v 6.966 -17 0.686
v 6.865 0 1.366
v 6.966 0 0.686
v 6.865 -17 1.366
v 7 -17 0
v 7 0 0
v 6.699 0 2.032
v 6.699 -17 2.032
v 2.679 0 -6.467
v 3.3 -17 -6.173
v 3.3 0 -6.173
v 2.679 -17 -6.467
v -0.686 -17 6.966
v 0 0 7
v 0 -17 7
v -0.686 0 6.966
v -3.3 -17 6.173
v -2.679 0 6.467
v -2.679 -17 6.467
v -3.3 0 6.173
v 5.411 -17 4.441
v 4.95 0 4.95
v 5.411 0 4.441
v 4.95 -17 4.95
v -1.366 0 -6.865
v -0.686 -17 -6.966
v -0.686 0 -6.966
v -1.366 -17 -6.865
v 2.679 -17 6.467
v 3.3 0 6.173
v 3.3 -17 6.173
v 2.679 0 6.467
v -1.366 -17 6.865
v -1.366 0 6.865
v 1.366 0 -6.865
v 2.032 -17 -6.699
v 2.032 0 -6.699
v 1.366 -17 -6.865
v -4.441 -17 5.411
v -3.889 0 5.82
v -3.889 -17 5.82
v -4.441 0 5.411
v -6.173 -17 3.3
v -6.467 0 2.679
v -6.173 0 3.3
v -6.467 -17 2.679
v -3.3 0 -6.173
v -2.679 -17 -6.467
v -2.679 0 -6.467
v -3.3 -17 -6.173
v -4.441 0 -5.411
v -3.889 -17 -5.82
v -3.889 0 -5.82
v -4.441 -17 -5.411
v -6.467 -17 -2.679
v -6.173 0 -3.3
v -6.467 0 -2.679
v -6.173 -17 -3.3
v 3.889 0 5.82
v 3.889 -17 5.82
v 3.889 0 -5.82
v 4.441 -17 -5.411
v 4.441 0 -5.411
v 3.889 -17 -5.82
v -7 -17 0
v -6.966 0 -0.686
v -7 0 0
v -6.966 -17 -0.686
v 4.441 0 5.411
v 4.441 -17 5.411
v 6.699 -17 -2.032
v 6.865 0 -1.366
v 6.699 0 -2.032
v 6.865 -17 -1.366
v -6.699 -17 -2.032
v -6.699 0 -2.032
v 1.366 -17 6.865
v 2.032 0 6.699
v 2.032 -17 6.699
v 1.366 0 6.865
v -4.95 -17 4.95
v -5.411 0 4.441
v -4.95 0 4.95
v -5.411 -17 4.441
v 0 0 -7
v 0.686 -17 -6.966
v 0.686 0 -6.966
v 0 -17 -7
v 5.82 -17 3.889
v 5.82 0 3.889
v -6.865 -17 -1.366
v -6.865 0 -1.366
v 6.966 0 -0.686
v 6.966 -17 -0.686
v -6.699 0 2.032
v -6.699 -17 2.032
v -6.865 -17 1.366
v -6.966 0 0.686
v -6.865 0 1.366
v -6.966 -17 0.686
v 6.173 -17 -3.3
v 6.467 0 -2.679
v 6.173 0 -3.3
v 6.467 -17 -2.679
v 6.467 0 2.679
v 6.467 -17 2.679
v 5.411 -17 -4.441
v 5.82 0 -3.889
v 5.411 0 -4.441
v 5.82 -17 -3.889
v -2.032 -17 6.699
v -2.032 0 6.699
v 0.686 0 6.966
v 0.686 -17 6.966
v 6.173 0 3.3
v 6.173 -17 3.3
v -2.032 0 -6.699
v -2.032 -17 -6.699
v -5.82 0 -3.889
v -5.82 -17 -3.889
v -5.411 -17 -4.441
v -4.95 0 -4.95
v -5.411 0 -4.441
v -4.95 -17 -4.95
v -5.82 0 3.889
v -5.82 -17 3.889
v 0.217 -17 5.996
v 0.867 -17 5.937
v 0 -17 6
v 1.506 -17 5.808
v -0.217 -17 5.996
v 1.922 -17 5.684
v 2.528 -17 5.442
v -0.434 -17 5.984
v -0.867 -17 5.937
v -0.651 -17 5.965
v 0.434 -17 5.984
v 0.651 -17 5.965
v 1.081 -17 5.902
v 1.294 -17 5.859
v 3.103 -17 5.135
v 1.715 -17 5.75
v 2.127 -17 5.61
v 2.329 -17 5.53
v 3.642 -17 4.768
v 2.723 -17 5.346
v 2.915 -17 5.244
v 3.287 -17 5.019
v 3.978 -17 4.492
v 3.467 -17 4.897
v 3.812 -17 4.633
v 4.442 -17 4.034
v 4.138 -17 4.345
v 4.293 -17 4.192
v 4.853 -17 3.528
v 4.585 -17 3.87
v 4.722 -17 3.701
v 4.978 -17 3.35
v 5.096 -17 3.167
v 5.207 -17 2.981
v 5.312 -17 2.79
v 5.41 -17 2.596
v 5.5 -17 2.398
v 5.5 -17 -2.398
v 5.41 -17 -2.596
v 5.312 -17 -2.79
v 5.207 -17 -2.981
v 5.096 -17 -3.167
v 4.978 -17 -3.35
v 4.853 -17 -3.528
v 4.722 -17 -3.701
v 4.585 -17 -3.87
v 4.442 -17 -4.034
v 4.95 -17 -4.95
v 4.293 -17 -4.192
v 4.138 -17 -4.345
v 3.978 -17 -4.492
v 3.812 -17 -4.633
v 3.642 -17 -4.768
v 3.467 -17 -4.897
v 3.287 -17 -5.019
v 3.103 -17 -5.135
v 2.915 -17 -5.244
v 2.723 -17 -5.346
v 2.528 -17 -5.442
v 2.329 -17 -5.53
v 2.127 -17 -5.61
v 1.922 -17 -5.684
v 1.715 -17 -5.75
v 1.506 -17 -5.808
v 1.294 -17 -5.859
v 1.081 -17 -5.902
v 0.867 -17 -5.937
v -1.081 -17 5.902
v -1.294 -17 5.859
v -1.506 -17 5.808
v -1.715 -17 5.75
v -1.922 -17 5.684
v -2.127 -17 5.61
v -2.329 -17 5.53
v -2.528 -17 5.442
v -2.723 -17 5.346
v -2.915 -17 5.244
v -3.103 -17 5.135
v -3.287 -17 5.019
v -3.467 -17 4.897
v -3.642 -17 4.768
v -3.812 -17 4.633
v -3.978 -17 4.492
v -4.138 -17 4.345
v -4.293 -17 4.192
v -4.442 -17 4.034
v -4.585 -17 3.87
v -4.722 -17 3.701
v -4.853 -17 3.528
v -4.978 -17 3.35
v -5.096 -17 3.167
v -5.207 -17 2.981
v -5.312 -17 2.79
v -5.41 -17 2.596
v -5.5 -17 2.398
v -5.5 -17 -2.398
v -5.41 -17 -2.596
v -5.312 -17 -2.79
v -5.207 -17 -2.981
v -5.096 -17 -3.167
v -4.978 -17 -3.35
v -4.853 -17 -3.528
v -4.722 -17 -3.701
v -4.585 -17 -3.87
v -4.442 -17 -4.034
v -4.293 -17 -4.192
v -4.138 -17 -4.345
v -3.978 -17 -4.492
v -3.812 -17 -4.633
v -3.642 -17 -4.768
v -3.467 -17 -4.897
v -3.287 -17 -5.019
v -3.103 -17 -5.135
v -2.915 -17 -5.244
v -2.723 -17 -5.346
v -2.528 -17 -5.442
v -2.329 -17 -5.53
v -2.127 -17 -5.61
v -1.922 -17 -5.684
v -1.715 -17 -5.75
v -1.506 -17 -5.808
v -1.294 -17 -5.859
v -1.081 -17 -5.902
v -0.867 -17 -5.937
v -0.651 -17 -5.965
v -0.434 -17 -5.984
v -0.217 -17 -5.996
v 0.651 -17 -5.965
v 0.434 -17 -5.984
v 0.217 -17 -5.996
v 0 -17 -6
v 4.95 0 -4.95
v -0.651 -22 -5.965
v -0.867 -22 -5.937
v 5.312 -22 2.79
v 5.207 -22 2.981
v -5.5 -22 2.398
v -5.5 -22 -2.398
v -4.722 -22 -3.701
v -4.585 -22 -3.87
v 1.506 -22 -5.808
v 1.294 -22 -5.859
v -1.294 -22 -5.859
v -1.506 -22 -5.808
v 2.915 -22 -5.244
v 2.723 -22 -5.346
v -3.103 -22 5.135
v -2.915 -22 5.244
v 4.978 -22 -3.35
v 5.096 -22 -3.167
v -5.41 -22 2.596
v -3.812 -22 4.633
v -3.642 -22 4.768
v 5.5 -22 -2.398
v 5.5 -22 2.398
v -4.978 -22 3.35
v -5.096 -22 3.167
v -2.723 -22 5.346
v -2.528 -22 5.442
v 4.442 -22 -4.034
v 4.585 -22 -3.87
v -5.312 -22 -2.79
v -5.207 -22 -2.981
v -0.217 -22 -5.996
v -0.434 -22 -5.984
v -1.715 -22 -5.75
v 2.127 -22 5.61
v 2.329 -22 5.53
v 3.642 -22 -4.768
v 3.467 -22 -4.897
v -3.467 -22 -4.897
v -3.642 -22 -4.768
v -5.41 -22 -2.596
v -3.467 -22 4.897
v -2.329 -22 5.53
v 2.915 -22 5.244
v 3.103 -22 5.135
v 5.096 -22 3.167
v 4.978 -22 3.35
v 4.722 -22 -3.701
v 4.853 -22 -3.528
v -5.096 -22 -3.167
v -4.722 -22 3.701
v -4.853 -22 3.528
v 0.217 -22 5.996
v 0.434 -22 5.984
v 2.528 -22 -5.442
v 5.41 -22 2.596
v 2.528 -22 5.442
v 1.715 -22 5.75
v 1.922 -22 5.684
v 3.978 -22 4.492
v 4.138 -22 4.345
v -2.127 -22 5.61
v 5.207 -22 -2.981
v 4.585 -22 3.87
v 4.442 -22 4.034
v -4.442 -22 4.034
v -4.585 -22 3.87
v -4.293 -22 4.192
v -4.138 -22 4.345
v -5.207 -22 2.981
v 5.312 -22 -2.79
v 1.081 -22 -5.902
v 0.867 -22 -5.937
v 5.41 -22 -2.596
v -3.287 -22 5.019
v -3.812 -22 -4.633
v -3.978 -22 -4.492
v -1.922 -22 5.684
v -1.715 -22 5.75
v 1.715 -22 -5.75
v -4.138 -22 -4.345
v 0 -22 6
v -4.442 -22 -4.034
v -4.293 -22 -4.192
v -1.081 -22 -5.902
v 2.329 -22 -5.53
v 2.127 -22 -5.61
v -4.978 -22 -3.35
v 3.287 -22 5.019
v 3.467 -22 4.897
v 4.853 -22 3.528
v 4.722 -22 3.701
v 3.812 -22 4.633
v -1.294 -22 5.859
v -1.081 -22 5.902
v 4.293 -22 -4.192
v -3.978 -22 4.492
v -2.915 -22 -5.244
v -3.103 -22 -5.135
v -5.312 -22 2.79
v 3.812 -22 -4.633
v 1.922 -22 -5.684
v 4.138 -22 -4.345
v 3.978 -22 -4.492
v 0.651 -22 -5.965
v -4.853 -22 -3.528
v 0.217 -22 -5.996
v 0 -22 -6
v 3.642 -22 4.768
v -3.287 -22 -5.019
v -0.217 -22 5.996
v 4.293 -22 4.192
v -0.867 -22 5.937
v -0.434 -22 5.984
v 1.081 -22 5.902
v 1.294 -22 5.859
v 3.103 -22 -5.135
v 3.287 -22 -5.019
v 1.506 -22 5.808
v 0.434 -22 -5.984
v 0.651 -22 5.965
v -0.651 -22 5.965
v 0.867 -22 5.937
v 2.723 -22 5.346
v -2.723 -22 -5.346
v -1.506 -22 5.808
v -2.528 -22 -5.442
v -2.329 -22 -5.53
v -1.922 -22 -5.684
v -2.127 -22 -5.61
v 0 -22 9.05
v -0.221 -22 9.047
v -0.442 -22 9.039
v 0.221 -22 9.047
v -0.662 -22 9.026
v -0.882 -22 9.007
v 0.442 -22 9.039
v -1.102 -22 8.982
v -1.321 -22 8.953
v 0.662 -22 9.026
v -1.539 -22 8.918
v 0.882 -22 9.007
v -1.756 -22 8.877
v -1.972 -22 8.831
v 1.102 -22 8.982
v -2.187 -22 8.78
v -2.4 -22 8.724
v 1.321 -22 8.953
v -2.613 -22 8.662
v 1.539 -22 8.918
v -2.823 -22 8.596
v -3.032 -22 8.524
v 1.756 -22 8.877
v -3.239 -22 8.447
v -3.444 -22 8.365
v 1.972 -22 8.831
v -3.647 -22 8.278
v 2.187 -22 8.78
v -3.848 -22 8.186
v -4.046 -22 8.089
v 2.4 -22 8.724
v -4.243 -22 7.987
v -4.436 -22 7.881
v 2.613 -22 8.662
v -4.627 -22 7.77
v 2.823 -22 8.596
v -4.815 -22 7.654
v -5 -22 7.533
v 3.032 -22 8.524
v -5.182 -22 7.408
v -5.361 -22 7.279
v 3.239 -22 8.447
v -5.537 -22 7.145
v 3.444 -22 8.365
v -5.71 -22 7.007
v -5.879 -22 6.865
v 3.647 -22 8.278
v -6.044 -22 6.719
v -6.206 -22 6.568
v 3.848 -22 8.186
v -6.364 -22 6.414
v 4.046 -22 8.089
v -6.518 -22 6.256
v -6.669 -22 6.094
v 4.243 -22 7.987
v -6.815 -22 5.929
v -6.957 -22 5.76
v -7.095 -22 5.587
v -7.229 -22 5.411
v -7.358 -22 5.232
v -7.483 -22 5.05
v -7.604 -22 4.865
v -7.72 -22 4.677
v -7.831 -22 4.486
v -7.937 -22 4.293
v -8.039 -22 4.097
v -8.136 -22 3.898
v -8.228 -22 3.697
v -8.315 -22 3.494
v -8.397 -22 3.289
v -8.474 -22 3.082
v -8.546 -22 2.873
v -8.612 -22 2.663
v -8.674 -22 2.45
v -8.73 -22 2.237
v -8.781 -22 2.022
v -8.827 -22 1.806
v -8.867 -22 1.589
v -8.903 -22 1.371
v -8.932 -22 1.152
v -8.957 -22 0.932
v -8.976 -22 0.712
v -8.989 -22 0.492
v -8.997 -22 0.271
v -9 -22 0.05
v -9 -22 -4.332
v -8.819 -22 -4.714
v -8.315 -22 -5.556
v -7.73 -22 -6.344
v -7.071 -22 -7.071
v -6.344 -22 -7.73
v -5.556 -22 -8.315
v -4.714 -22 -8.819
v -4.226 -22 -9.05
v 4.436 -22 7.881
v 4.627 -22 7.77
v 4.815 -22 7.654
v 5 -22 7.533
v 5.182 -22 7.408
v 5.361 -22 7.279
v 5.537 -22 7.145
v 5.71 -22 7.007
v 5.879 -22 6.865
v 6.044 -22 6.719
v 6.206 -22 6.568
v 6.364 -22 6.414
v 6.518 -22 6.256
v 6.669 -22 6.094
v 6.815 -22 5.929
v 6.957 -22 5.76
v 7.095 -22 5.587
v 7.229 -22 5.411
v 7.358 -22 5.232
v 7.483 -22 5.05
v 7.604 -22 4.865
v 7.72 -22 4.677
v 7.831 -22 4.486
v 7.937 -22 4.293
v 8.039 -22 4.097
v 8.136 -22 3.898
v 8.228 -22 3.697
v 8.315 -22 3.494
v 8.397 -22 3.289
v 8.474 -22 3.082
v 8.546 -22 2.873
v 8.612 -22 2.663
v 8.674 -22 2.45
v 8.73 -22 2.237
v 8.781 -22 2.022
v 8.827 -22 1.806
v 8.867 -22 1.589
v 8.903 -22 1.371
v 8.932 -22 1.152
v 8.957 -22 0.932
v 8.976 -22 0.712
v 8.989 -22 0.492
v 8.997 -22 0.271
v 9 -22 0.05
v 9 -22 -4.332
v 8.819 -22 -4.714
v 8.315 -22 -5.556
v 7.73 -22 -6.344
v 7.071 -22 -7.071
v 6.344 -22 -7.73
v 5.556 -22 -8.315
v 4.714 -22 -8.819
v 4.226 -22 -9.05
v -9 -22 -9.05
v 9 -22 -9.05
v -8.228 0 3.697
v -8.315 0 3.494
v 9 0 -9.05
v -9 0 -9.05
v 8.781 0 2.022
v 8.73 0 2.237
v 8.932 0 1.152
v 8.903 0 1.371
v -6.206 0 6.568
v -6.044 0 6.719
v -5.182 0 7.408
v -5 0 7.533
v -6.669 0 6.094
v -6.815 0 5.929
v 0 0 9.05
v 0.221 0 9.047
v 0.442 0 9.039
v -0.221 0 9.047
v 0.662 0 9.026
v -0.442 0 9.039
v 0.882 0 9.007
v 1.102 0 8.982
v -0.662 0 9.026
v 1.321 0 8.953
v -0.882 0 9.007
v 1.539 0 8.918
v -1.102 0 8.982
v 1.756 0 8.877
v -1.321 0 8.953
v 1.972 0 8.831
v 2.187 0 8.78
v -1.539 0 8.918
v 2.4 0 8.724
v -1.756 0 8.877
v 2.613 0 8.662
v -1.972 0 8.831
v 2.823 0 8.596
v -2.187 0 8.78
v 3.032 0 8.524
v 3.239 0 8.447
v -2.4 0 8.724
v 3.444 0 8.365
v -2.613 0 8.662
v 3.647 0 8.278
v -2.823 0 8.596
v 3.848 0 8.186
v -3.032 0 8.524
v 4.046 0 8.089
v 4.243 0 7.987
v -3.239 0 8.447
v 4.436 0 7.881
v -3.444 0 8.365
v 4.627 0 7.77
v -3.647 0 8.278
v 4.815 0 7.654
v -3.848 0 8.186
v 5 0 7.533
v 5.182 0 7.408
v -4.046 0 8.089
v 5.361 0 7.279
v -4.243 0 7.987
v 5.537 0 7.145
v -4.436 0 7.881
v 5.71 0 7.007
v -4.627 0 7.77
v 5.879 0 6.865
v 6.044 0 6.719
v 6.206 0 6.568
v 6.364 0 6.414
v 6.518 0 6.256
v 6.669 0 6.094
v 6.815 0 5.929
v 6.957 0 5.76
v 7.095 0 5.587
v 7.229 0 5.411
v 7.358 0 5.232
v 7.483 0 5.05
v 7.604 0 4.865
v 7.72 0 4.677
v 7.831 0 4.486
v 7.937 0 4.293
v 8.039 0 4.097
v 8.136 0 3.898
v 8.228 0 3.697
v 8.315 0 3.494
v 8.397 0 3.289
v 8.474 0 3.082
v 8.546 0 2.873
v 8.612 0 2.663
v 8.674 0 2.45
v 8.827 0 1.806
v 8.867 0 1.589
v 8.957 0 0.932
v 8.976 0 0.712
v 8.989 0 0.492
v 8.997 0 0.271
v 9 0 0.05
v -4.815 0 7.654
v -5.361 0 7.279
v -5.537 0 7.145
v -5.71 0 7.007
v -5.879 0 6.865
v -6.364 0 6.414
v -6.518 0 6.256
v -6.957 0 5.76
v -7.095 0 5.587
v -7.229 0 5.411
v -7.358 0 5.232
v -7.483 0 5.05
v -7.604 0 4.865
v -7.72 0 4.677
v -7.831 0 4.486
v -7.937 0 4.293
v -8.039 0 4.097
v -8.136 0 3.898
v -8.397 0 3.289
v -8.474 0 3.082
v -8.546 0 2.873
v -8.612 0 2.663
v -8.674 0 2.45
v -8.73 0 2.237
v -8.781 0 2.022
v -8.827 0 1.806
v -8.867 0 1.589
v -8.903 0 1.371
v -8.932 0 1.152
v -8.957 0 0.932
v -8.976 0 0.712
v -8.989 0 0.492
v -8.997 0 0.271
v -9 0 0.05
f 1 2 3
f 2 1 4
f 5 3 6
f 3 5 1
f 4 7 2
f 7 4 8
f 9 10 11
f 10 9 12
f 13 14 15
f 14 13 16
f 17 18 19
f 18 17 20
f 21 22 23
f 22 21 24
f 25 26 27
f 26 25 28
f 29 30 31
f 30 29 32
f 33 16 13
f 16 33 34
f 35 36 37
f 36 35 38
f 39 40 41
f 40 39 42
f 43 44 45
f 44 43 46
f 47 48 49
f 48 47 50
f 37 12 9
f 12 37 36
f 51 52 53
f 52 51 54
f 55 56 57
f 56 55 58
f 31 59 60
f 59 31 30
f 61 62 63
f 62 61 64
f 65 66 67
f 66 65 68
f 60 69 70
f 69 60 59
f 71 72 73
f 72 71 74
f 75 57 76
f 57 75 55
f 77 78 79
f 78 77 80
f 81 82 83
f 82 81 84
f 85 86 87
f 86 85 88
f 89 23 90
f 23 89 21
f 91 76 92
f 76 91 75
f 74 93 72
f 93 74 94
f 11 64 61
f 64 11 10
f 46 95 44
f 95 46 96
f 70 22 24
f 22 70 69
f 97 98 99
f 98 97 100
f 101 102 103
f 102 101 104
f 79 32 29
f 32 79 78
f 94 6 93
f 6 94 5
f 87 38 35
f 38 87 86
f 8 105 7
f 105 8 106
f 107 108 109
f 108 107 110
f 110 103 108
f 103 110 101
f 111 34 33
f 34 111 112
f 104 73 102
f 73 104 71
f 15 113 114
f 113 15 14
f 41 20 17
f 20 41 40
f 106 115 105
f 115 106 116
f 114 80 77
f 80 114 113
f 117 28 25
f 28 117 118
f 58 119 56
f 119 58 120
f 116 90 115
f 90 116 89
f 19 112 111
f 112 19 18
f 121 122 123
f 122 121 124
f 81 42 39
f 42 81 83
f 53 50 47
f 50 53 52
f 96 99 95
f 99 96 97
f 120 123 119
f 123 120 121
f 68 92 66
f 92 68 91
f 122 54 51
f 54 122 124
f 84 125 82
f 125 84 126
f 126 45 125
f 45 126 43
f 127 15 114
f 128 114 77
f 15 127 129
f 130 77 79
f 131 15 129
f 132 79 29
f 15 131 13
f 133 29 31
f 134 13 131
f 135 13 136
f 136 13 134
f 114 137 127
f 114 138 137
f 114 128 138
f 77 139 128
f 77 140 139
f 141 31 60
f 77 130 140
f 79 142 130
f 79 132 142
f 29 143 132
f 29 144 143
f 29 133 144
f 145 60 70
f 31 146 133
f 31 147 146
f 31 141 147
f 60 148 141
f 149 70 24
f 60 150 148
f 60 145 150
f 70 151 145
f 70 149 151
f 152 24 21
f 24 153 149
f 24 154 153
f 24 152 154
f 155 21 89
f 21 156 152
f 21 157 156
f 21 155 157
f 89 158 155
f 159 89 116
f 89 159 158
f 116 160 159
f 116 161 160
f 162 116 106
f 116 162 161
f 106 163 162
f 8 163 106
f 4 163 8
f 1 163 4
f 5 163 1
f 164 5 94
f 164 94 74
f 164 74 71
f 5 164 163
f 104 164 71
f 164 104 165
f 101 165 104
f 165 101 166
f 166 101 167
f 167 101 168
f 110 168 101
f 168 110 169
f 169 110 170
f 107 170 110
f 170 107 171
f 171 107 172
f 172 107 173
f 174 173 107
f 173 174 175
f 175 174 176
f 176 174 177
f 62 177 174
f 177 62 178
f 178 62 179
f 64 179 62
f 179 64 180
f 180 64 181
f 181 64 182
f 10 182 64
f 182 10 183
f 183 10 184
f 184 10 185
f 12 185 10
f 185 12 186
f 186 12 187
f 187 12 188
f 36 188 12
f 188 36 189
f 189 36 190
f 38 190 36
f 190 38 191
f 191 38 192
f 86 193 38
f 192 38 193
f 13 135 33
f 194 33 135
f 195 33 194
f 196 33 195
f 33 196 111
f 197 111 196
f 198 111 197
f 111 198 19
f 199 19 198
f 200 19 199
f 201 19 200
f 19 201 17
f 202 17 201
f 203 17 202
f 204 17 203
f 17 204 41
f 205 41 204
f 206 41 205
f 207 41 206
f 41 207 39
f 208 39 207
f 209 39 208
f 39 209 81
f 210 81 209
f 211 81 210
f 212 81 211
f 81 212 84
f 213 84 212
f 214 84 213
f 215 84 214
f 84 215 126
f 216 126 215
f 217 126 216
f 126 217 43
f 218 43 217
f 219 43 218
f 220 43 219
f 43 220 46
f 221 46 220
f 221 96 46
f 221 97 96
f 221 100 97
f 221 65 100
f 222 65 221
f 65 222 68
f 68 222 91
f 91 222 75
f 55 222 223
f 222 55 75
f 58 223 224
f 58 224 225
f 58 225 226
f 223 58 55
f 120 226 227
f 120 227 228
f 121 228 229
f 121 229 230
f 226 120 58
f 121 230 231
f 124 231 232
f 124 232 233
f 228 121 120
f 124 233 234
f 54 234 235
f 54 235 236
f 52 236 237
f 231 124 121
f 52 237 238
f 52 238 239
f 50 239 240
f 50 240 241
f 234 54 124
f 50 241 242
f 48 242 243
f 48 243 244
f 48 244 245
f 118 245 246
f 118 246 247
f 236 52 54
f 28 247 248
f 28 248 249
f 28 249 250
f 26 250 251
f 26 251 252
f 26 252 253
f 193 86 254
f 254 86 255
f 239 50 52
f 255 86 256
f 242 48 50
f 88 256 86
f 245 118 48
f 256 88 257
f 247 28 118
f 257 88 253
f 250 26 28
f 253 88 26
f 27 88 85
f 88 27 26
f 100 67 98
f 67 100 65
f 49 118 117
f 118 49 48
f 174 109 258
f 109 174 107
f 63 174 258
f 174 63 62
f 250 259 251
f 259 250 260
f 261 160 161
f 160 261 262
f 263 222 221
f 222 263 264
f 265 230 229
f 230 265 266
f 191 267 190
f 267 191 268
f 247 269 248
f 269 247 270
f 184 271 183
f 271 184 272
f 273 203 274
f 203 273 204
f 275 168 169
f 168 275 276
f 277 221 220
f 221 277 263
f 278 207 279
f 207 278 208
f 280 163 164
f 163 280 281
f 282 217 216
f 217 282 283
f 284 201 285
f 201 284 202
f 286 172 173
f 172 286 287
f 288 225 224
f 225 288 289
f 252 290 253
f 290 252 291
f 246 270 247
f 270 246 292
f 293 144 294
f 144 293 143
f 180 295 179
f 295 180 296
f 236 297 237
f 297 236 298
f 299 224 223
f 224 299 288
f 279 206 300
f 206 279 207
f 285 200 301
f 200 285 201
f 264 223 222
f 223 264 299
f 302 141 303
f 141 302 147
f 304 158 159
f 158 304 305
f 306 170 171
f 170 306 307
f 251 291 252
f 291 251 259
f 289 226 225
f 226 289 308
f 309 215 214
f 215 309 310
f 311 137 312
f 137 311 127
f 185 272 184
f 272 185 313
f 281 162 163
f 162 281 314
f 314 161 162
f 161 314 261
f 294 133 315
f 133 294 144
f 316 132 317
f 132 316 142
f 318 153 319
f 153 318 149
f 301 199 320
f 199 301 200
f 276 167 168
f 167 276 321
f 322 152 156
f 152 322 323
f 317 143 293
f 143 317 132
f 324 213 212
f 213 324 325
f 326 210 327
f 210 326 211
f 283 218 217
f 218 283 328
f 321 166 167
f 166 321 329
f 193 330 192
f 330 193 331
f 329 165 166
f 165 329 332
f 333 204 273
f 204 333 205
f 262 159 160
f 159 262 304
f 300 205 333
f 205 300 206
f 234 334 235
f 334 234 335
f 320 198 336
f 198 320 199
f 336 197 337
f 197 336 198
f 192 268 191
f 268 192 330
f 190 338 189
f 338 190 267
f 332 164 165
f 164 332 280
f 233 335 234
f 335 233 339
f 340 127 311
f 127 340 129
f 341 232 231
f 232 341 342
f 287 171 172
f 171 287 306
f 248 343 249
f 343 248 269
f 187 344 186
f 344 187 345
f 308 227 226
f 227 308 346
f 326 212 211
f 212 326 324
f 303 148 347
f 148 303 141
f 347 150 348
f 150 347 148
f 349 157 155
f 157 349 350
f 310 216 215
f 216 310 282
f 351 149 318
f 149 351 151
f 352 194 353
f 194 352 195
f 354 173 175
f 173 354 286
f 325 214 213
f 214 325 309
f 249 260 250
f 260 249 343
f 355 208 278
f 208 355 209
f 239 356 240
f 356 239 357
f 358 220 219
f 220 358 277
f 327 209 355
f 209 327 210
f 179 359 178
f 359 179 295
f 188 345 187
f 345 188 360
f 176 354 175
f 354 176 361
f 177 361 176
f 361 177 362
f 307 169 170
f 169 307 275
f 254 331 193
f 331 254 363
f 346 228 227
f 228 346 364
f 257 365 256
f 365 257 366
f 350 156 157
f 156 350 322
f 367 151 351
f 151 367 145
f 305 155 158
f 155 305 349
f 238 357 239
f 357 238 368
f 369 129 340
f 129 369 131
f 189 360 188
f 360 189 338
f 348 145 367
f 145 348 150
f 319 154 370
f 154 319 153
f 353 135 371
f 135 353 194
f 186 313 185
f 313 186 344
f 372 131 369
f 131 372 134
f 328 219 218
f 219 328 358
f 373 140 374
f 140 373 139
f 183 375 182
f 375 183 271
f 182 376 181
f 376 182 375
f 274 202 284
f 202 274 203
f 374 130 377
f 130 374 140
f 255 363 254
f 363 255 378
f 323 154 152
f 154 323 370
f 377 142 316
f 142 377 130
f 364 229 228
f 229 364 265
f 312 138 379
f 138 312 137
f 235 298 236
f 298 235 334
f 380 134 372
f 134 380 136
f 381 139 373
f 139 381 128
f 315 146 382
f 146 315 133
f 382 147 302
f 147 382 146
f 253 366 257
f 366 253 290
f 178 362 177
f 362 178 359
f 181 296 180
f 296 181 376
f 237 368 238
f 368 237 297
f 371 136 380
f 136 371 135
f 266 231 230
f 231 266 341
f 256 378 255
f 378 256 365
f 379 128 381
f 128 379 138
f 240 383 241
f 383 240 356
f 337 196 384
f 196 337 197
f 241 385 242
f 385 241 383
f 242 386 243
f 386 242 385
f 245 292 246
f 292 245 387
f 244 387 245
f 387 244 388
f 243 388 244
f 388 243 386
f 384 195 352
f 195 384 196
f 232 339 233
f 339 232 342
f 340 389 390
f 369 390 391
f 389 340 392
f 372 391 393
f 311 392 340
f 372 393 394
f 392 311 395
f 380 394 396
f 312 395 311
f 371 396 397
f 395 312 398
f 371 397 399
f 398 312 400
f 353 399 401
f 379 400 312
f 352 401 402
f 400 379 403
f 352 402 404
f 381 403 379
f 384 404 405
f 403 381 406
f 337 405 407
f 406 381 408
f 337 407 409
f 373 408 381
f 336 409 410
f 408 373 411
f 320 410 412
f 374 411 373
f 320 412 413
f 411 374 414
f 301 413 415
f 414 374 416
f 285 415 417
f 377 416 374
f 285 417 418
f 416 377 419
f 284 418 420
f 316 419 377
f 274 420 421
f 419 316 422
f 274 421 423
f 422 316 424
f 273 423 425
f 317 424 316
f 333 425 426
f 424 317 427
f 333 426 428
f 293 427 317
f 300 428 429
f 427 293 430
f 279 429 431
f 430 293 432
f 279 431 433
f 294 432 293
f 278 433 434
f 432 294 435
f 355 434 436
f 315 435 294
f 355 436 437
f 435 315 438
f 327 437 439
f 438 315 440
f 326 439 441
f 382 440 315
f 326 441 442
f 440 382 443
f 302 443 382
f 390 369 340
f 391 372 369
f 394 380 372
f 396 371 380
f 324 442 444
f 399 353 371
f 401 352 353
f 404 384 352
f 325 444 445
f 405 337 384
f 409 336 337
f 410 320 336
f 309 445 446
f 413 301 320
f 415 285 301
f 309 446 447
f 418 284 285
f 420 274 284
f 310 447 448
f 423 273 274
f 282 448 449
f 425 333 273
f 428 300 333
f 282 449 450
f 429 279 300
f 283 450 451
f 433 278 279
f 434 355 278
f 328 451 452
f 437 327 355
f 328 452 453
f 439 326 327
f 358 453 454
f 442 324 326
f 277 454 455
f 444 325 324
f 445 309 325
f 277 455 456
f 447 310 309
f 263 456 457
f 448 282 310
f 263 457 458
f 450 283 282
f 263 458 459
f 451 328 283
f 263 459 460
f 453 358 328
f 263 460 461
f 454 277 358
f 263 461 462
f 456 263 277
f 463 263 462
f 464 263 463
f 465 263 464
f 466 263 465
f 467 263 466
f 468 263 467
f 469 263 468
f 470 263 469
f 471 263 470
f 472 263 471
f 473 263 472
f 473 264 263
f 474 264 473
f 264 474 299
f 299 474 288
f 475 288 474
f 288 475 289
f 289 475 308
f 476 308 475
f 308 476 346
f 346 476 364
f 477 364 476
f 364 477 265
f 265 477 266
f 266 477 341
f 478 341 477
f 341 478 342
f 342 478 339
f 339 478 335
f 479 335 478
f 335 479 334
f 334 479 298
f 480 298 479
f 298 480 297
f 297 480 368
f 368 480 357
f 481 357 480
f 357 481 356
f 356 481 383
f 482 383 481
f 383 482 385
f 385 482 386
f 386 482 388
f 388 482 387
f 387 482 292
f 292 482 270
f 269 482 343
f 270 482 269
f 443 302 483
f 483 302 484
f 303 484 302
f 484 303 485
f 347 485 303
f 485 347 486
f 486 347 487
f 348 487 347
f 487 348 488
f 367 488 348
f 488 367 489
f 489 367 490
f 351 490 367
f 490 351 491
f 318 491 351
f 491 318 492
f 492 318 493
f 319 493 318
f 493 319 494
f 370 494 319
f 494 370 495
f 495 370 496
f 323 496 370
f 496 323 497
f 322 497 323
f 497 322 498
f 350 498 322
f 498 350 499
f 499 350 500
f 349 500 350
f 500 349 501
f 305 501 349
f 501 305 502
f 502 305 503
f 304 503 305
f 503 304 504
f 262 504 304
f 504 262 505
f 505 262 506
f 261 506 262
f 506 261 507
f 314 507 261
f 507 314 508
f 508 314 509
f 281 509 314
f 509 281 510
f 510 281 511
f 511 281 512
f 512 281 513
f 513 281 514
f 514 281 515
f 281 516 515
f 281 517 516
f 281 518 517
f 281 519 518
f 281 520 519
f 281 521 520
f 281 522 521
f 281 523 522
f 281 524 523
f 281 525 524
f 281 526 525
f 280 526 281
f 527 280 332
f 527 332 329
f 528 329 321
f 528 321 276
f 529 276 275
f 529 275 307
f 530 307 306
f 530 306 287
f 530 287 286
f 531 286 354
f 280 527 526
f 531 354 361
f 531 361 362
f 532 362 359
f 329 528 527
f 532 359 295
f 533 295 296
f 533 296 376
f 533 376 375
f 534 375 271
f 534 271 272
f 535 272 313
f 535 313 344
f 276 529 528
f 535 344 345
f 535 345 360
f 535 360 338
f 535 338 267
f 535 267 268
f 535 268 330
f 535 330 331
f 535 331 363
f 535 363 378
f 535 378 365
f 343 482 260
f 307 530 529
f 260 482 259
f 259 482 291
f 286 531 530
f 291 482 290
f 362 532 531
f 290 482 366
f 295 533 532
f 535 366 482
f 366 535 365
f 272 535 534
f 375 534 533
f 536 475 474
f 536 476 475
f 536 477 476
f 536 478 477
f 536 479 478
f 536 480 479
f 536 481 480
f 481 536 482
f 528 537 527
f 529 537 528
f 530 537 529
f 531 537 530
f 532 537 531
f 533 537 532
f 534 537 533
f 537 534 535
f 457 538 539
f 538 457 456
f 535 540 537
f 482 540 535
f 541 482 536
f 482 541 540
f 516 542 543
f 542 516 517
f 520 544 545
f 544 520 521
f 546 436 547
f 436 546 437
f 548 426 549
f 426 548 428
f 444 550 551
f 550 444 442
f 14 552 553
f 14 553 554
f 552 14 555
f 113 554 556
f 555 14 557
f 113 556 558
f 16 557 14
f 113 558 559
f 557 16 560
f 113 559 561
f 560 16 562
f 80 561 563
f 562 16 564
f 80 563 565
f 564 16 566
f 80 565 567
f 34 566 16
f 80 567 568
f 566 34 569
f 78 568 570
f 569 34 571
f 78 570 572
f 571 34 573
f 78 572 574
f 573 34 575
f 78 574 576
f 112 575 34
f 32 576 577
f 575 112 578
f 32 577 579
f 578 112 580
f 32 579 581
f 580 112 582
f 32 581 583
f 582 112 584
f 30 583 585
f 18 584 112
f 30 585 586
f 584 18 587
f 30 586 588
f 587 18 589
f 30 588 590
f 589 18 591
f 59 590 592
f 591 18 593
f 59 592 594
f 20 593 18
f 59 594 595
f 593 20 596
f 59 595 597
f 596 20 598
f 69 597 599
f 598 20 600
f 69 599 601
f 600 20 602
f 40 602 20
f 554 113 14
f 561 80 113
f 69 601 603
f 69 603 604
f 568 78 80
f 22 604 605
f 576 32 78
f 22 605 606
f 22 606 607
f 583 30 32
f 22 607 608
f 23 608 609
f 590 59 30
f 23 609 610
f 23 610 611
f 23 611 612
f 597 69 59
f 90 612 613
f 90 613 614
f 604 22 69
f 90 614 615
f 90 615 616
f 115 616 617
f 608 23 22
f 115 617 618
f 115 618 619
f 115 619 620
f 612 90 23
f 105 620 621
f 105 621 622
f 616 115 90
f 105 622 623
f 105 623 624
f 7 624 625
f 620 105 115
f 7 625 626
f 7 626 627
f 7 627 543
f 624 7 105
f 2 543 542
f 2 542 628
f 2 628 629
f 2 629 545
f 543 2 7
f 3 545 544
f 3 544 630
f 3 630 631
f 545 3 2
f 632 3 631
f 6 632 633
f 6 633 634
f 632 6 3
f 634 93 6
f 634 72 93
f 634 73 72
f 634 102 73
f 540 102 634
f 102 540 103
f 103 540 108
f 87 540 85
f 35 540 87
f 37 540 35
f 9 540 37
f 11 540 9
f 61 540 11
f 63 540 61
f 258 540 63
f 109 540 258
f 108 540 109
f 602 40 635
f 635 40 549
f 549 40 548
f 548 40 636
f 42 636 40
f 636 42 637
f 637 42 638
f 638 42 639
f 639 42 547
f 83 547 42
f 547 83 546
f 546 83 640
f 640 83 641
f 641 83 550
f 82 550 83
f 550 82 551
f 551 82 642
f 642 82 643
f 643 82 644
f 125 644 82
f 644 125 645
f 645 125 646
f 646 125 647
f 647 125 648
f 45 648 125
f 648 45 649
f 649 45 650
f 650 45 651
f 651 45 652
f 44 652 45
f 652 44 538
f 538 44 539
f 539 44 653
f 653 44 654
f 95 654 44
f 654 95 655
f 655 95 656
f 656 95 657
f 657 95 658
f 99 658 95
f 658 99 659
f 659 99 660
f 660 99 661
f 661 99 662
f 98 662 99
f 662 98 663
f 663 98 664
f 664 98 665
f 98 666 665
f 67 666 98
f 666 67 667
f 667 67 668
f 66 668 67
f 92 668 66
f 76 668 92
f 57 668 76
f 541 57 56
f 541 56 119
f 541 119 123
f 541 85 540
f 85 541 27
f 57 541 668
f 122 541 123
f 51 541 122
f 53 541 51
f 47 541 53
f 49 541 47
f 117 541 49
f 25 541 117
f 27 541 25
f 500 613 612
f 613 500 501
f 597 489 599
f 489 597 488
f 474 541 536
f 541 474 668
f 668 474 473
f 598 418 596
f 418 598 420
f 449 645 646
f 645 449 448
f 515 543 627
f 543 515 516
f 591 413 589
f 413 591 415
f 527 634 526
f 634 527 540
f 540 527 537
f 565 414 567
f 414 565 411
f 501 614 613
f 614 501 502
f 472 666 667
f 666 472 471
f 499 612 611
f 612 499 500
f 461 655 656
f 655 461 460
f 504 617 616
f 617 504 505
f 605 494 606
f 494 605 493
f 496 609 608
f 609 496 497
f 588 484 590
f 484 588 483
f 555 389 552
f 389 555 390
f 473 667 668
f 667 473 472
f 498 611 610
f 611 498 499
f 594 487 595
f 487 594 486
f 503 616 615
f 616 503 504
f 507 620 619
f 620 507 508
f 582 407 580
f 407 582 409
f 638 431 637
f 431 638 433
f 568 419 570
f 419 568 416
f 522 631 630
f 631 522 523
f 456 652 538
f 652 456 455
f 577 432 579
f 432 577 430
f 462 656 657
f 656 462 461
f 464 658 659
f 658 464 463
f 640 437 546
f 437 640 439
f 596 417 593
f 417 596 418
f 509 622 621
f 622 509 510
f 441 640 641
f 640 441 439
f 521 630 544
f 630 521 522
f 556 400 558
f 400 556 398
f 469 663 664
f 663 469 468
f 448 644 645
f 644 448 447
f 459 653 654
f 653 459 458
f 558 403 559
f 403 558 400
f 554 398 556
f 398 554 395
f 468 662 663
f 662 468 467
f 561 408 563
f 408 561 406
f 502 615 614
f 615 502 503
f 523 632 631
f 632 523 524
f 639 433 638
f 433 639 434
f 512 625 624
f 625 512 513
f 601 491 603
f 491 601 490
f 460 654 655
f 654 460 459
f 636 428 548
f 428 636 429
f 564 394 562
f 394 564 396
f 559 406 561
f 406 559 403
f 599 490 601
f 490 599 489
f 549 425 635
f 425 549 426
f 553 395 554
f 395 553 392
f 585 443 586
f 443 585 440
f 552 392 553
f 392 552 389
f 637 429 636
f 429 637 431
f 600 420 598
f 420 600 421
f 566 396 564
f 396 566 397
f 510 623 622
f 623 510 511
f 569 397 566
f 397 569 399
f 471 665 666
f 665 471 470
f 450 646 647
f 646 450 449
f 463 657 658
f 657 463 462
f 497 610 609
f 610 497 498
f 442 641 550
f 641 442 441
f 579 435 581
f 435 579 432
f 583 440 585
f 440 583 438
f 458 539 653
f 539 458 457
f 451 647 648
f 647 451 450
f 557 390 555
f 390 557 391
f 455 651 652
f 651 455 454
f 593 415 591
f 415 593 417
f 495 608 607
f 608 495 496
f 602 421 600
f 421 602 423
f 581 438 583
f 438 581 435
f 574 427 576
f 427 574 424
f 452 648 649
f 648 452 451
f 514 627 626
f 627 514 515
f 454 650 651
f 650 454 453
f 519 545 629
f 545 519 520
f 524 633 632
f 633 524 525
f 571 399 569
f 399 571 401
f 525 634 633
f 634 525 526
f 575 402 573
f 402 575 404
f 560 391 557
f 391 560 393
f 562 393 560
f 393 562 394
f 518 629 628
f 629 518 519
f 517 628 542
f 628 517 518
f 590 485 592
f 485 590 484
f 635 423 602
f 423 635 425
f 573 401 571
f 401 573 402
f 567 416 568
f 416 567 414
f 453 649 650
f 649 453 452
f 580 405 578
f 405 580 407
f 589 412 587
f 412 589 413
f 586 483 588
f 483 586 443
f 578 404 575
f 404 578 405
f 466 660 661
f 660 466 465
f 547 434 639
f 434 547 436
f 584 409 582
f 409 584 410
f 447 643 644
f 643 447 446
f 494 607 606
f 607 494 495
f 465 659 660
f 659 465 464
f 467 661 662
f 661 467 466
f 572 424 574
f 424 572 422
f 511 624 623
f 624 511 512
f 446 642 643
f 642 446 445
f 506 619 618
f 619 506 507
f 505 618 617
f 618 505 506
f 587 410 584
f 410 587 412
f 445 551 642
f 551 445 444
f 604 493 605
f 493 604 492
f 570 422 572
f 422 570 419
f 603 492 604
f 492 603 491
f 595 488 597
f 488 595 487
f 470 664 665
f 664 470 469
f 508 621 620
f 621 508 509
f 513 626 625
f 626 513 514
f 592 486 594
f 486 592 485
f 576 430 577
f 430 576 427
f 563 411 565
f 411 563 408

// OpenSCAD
// Start: lazy_union
default_5_default_5();
// End: lazy_union

// Modules.

// 'PartMaterial undef-default - default 5.0'
module default_5_default_5() {
  // 'None : _combine_solids_and_holes'
  union() {
    // '_combine_solids_and_holes'
    difference() {
      // 'default : _combine_solids_and_holes'
      union() {
        // 'extender'
        multmatrix(m=[[-0.0, -1.0, -0.0, -0.0], [-0.0, -0.0, -1.0, -11.0], [1.0, 0.0, 0.0, 0.0], [0.0, 0.0, 0.0, 1.0]]) {
          // 'extender'
          color(c=[0.0, 0.5019607843137255, 0.0, 1.0]) {
            // 'extender : _combine_solids_and_holes'
            union() {
              // 'cage'
              %multmatrix(m=[[1.0, 0.0, 0.0, -9.05], [0.0, 1.0, 0.0, -9.0], [0.0, 0.0, 1.0, -11.0], [0.0, 0.0, 0.0, 1.0]]) {
                // 'cage'
                color(c=[0.0, 1.0, 0.35, 0.4]) {
                  // 'cage : _combine_solids_and_holes'
                  union() {
                    // 'cage'
                    cube(size=[18.1, 18.0, 22.0]);
                  }
                }
              }
              // 'stadium'
              multmatrix(m=[[-1.0, 0.0, 0.0, 9.05], [0.0, -1.0, 0.0, 0.0], [0.0, 0.0, 1.0, -11.0], [0.0, 0.0, 0.0, 1.0]]) {
                // 'stadium : _combine_solids_and_holes'
                union() {
                  // 'stadium'
                  linear_extrude(height=22.0, twist=0.0, slices=4, scale=[1.0, 1.0], $fn=64) {
                    polygon(points=[[9.0, 9.0], [18.1, 9.0], [18.1, -9.0], [9.000000000000002, -9.0], [8.779128943293792, -8.997289368265838], [8.55839093105324, -8.989159105846552], [8.337918927602995, -8.975614110108213], [8.117845737033957, -8.956662540049772], [7.898303923207056, -8.93231581138839], [7.679425729901746, -8.90258858968303], [7.4613430011572905, -8.86749878150047], [7.244187101854847, -8.827067523629074], [7.028088838588174, -8.781319170346757], [6.813178380870626, -8.730281278750896], [6.599585182725916, -8.67398459215896], [6.3874379047098415, -8.61246302158988], [6.176864336409979, -8.54575362533733], [5.967991319470022, -8.473896586647188], [5.760944671185108, -8.39693518951265], [5.5558491087141935, -8.31491579260158], [5.352828173955093, -8.227887801331777], [5.152004159127465, -8.13590363811099], [4.9534980331085405, -8.039018710759636], [4.757429368566021, -7.937291379135195], [4.563916269931945, -7.830782919978403], [4.3730753022610065, -7.719557490002448], [4.185021421016128, -7.603682087247365], [3.999867902823583, -7.483226510722908], [3.8177262772393927, -7.358263318364253], [3.6387062595681003, -7.228867783325804], [3.4629156847743605, -7.095117848639457], [3.290460442527192, -6.957094080264634], [3.1214444134160084, -6.8148796185583596], [2.955969406376835, -6.66856012819463], [2.7941350973663983, -6.518223746563201], [2.6360389693210733, -6.363961030678928], [2.4817762534367995, -6.205864902633603], [2.3314398718053706, -6.044030593623166], [2.1851203814416413, -5.8785555865839925], [2.042905919735367, -5.709539557472809], [1.9048821513605443, -5.537084315225641], [1.7711322166741965, -5.3612937404319005], [1.6417366816357477, -5.182273722760608], [1.5167734892770923, -5.000132097176419], [1.396317912752636, -4.814978578983873], [1.2804425099975525, -4.626924697738995], [1.169217080021598, -4.436083730068057], [1.0627086208648056, -4.2425706314339795], [0.9609812892403635, -4.046501966891461], [0.864096361889013, -3.847995840872541], [0.7721121986682231, -3.6471718260449086], [0.68508420739842, -3.4441508912858083], [0.60306481048735, -3.2390553288148944], [0.5261034133528124, -3.0320086805299784], [0.45424637466267015, -2.8231356635900218], [0.3875369784101199, -2.6125620952901607], [0.3260154078410409, -2.4004148172740853], [0.2697187212491041, -2.186821619129376], [0.21868082965324476, -1.9719111614118294], [0.17293247637092612, -1.7558128981451564], [0.13250121849952912, -1.5386569988427137], [0.09741141031697076, -1.3205742700982552], [0.06768418861160974, -1.101696076792946], [0.04333745995022831, -0.8821542629660462], [0.02438588989178747, -0.6620810723970043], [0.010840894153448133, -0.4416090689467604], [0.0027106317341623054, -0.22087105670620957], [0.0, 3.1090109358278395e-16], [0.0027106317341623054, 0.2208710567062098], [0.010840894153448133, 0.44160906894676055], [0.02438588989178747, 0.6620810723970084], [0.04333745995022831, 0.8821542629660463], [0.06768418861160974, 1.1016960767929458], [0.09741141031697076, 1.320574270098255], [0.13250121849952734, 1.5386569988427095], [0.17293247637092612, 1.755812898145156], [0.21868082965324298, 1.971911161411829], [0.2697187212491041, 2.186821619129375], [0.3260154078410409, 2.400414817274085], [0.3875369784101199, 2.6125620952901594], [0.4542463746626684, 2.823135663590021], [0.5261034133528124, 3.032008680529981], [0.60306481048735, 3.239055328814893], [0.6850842073984182, 3.4441508912858074], [0.7721121986682231, 3.6471718260449073], [0.8640963618890094, 3.8479958408725365], [0.9609812892403617, 4.04650196689146], [1.0627086208648047, 4.242570631433979], [1.1692170800215962, 4.436083730068056], [1.2804425099975507, 4.6269246977389935], [1.396317912752635, 4.814978578983872], [1.5167734892770905, 5.000132097176418], [1.641736681635746, 5.182273722760608], [1.7711322166741947, 5.361293740431899], [1.9048821513605425, 5.53708431522564], [2.0429059197353654, 5.709539557472807], [2.1851203814416396, 5.878555586583992], [2.331439871805368, 6.044030593623166], [2.481776253436797, 6.205864902633601], [2.6360389693210706, 6.363961030678927], [2.7941350973663956, 6.5182237465632005], [2.9559694063768314, 6.668560128194629], [3.1214444134160058, 6.814879618558358], [3.290460442527186, 6.957094080264629], [3.4629156847743543, 7.095117848639452], [3.6387062595681012, 7.228867783325805], [3.817726277239392, 7.358263318364254], [3.9998679028235795, 7.483226510722907], [4.185021421016124, 7.603682087247363], [4.373075302261003, 7.7195574900024475], [4.5639162699319415, 7.830782919978401], [4.757429368566019, 7.937291379135194], [4.953498033108537, 8.039018710759636], [5.152004159127457, 8.135903638110989], [5.352828173955093, 8.227887801331777], [5.555849108714186, 8.314915792601578], [5.760944671185108, 8.39693518951265], [5.96799131947002, 8.473896586647188], [6.176864336409976, 8.54575362533733], [6.387437904709836, 8.61246302158988], [6.599585182725912, 8.67398459215896], [6.813178380870621, 8.730281278750896], [7.028088838588168, 8.781319170346757], [7.24418710185484, 8.827067523629072], [7.461343001157283, 8.86749878150047], [7.679425729901745, 8.90258858968303], [7.898303923207047, 8.93231581138839], [8.117845737033955, 8.956662540049772], [8.337918927602992, 8.975614110108213], [8.558390931053236, 8.989159105846552], [8.779128943293786, 8.997289368265838]]);
                  }
                }
              }
            }
          }
        }
      }
      // 'default'
      multmatrix(m=[[1.0, 0.0, 0.0, 0.0], [0.0, 0.0, -1.0, -17.0], [0.0, 1.0, 0.0, 0.0], [0.0, 0.0, 0.0, 1.0]]) {
        // 'housing : _combine_solids_and_holes'
        union() {
          // 'outer'
          multmatrix(m=[[1.0, 0.0, 0.0, 0.0], [0.0, 1.0, 0.0, 0.0], [0.0, 0.0, 1.0, -2.0], [0.0, 0.0, 0.0, 1.0]]) {
            // 'outer : _combine_solids_and_holes'
            union() {
              // 'outer'
              cylinder(h=2.0, r1=7.0, r2=7.0, center=false, $fn=64);
            }
          }
          // 'body'
          multmatrix(m=[[0.0, -1.0, 0.0, 0.0], [1.0, 0.0, 0.0, 0.0], [0.0, 0.0, 1.0, 0.0], [0.0, 0.0, 0.0, 1.0]]) {
            // 'body : _combine_solids_and_holes'
            union() {
              // 'body'
              linear_extrude(height=11.2, twist=0.0, slices=4, scale=[1.0, 1.0], $fn=64) {
                polygon(points=[[0.0, -5.5], [2.3979157616563596, -5.5], [2.5956140307896067, -5.409509016830283], [2.789903882072988, -5.311914563393699], [2.980530184740023, -5.207344795368711], [3.167242618795151, -5.095937028033964], [3.3497960037202077, -4.977837555953401], [3.52795062043202, -4.85320146087027], [3.7014725260683456, -4.7221924080623], [3.8701338611888003, -4.584982431425432], [4.03371314898736, -4.441751707568363], [4.191995586123549, -4.292688319214509], [4.344773324790391, -4.137988008222093], [4.4918457456487415, -3.9778539185466957], [4.633019721269585, -3.8124963294837526], [4.768109869738382, -3.6421323795413363], [4.896938798088409, -3.46698578130578], [5.019337335243476, -3.287286527674599], [5.13514475416409, -3.1032705898424386], [5.244208982905377, -2.9151796074366576], [5.346386804309622, -2.7232605712094355], [5.4415440440711675, -2.5277654987030735], [5.52955574692675, -2.328951103314398], [5.610306340739891, -2.1270784571928174], [5.683689788263884, -1.9224126484147086], [5.749609726384081, -1.7152224328843098], [5.807979592656652, -1.5057798814182197], [5.858722738977626, -1.2943600224769367], [5.901772532232979, -1.0812404810125857], [5.937072441797577, -0.8667011139070708], [5.964576113768092, -0.6510236424793807], [5.984247431832404, -0.43449128254462044], [5.996060564695558, -0.21738837251055076], [6.0, 0.0], [5.996060564695558, 0.21738837251055076], [5.984247431832404, 0.43449128254462044], [5.964576113768092, 0.6510236424793807], [5.937072441797577, 0.8667011139070708], [5.901772532232979, 1.0812404810125864], [5.858722738977627, 1.294360022476936], [5.807979592656652, 1.5057798814182193], [5.749609726384081, 1.7152224328843098], [5.683689788263884, 1.9224126484147086], [5.610306340739891, 2.1270784571928174], [5.52955574692675, 2.328951103314398], [5.4415440440711675, 2.5277654987030735], [5.346386804309622, 2.7232605712094355], [5.244208982905377, 2.915179607436658], [5.135144754164089, 3.103270589842439], [5.019337335243476, 3.2872865276746], [4.89693879808841, 3.4669857813057794], [4.768109869738382, 3.6421323795413354], [4.633019721269585, 3.8124963294837526], [4.4918457456487415, 3.9778539185466957], [4.344773324790391, 4.137988008222093], [4.191995586123549, 4.292688319214509], [4.03371314898736, 4.441751707568363], [3.8701338611888016, 4.5849824314254315], [3.7014725260683456, 4.7221924080623], [3.5279506204320206, 4.85320146087027], [3.3497960037202077, 4.977837555953402], [3.167242618795151, 5.095937028033964], [2.980530184740022, 5.207344795368712], [2.789903882072988, 5.311914563393699], [2.5956140307896054, 5.409509016830284], [2.3979157616563596, 5.5], [-2.3979157616563596, 5.5], [-2.595614030789606, 5.409509016830283], [-2.7899038820729882, 5.311914563393699], [-2.9805301847400223, 5.207344795368712], [-3.167242618795152, 5.095937028033964], [-3.3497960037202077, 4.977837555953401], [-3.527950620432021, 4.853201460870269], [-3.701472526068346, 4.722192408062299], [-3.8701338611888016, 4.584982431425431], [-4.03371314898736, 4.441751707568363], [-4.191995586123548, 4.292688319214509], [-4.344773324790392, 4.137988008222093], [-4.491845745648741, 3.977853918546696], [-4.633019721269586, 3.8124963294837526], [-4.768109869738382, 3.6421323795413363], [-4.89693879808841, 3.4669857813057785], [-5.019337335243476, 3.287286527674599], [-5.135144754164089, 3.10327058984244], [-5.244208982905377, 2.9151796074366576], [-5.346386804309622, 2.7232605712094364], [-5.441544044071168, 2.527765498703073], [-5.529555746926749, 2.328951103314399], [-5.610306340739891, 2.127078457192817], [-5.683689788263883, 1.9224126484147095], [-5.74960972638408, 1.7152224328843118], [-5.807979592656652, 1.5057798814182197], [-5.858722738977627, 1.2943600224769356], [-5.901772532232979, 1.0812404810125857], [-5.937072441797577, 0.8667011139070717], [-5.964576113768092, 0.65102364247938], [-5.984247431832404, 0.4344912825446212], [-5.996060564695558, 0.21738837251055285], [-6.0, 7.347880794884119e-16], [-5.996060564695558, -0.21738837251055138], [-5.984247431832404, -0.4344912825446197], [-5.964576113768093, -0.6510236424793786], [-5.937072441797577, -0.8667011139070702], [-5.901772532232979, -1.0812404810125842], [-5.858722738977627, -1.294360022476934], [-5.807979592656652, -1.5057798814182184], [-5.749609726384081, -1.7152224328843104], [-5.683689788263884, -1.9224126484147082], [-5.610306340739891, -2.127078457192815], [-5.52955574692675, -2.3289511033143975], [-5.441544044071169, -2.527765498703072], [-5.346386804309624, -2.7232605712094324], [-5.244208982905378, -2.9151796074366563], [-5.13514475416409, -3.1032705898424386], [-5.019337335243477, -3.2872865276745977], [-4.89693879808841, -3.4669857813057776], [-4.768109869738383, -3.6421323795413345], [-4.633019721269585, -3.8124963294837535], [-4.491845745648742, -3.9778539185466957], [-4.344773324790394, -4.1379880082220915], [-4.19199558612355, -4.292688319214508], [-4.033713148987362, -4.441751707568362], [-3.870133861188803, -4.584982431425431], [-3.701472526068348, -4.722192408062298], [-3.5279506204320246, -4.853201460870267], [-3.3497960037202112, -4.977837555953398], [-3.1672426187951532, -5.095937028033964], [-2.9805301847400236, -5.20734479536871], [-2.7899038820729873, -5.3119145633936995], [-2.595614030789605, -5.409509016830284], [-2.3979157616563613, -5.5]]);
              }
            }
          }
          // 'top_access_hole'
          multmatrix(m=[[1.0, 0.0, 0.0, 0.0], [0.0, 1.0, 0.0, 0.0], [0.0, 0.0, 1.0, -22.0], [0.0, 0.0, 0.0, 1.0]]) {
            // 'top_access_hole'
            color(c=[0.0, 1.0, 1.0, 1.0]) {
              // 'top_access_hole : _combine_solids_and_holes'
              union() {
                // 'top_access_hole'
                cylinder(h=20.0, r1=7.0, r2=7.0, center=false, $fn=64);
              }
            }
          }
          // 'rear_access_hole'
          multmatrix(m=[[1.0, 0.0, 0.0, 0.0], [0.0, 1.0, 0.0, 0.0], [0.0, 0.0, 1.0, 5.0], [0.0, 0.0, 0.0, 1.0]]) {
            // 'rear_access_hole'
            color(c=[1.0, 0.7529411764705882, 0.796078431372549, 1.0]) {
              // 'rear_access_hole : _combine_solids_and_holes'
              union() {
                // 'rear_access_hole'
                cylinder(h=12.2, r1=10.0, r2=10.0, center=false, $fn=64);
              }
            }
          }
        }
      }
    }
  }
} // end module default_5_default_5
